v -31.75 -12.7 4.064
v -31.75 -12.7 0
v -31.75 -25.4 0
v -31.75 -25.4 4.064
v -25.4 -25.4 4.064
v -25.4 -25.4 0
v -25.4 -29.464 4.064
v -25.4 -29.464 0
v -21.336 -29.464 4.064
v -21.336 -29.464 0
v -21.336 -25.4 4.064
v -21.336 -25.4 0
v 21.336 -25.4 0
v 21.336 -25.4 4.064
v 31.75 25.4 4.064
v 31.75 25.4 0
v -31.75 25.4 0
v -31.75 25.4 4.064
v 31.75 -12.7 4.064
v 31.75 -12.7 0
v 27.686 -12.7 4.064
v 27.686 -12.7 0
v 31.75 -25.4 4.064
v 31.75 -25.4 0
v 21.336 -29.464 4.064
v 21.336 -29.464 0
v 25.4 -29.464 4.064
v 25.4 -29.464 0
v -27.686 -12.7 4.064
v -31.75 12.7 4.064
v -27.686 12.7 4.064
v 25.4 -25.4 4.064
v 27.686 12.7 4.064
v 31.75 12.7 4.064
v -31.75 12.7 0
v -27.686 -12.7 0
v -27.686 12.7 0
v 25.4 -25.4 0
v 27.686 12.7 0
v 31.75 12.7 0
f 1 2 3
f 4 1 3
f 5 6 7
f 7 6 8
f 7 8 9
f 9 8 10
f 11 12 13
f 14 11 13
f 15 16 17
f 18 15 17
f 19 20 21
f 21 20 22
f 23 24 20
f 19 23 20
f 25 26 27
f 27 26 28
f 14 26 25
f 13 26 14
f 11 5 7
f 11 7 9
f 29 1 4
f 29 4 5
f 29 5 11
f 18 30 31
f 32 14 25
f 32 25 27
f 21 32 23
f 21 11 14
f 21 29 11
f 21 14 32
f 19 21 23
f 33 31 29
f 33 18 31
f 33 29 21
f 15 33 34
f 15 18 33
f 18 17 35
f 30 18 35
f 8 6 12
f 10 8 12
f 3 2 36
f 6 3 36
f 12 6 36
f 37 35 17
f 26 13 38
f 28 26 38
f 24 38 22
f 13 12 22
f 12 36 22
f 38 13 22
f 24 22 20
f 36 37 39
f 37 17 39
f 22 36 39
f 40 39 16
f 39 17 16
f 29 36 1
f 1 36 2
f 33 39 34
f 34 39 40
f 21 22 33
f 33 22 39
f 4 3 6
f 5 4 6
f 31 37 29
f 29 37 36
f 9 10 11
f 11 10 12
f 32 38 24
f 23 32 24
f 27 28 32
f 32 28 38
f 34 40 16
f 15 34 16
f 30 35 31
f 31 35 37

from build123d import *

# Parameters (mm, degrees)
F1_DEPTH = 4.064
F0_W     = 4.064
F0_H     = 4.064
F2_DEPTH = 4.064


# Not quite as in the source:
# - a feature names something its author has since deleted; it is built from what else it names


with BuildPart() as f1:
    # F0 (on Top) → F1 (new body)
    with BuildSketch(Plane.XY):
        Polygon((31.75, 12.7), (31.75, 25.4), (-31.75, 25.4), (-31.75, 12.7), (-27.686, 12.7), (-27.686, -12.7), (-31.75, -12.7), (-31.75, -25.4), (-25.4, -25.4), (-25.4, -21.336), (25.4, -21.336), (25.4, -25.4), (31.75, -25.4), (31.75, -12.7), (27.686, -12.7), (27.686, 12.7), align=None)
    extrude(amount=F1_DEPTH)

    # F0 (on Top) → F2 (join)
    with BuildSketch(Plane.XY):
        Polygon((21.336, -25.4), (25.4, -25.4), (25.4, -21.336), (-25.4, -21.336), (-25.4, -25.4), (-21.336, -25.4), align=None)
        with Locations((23.368, -27.432)):
            Rectangle(F0_W, F0_H)
        with Locations((-23.368, -27.432)):
            Rectangle(F0_W, F0_H)
        Polygon((31.75, 12.7), (31.75, 25.4), (-31.75, 25.4), (-31.75, 12.7), (-27.686, 12.7), (-27.686, -12.7), (-31.75, -12.7), (-31.75, -25.4), (-25.4, -25.4), (-25.4, -21.336), (25.4, -21.336), (25.4, -25.4), (31.75, -25.4), (31.75, -12.7), (27.686, -12.7), (27.686, 12.7), align=None)
    extrude(amount=F2_DEPTH)


solid = f1.part
